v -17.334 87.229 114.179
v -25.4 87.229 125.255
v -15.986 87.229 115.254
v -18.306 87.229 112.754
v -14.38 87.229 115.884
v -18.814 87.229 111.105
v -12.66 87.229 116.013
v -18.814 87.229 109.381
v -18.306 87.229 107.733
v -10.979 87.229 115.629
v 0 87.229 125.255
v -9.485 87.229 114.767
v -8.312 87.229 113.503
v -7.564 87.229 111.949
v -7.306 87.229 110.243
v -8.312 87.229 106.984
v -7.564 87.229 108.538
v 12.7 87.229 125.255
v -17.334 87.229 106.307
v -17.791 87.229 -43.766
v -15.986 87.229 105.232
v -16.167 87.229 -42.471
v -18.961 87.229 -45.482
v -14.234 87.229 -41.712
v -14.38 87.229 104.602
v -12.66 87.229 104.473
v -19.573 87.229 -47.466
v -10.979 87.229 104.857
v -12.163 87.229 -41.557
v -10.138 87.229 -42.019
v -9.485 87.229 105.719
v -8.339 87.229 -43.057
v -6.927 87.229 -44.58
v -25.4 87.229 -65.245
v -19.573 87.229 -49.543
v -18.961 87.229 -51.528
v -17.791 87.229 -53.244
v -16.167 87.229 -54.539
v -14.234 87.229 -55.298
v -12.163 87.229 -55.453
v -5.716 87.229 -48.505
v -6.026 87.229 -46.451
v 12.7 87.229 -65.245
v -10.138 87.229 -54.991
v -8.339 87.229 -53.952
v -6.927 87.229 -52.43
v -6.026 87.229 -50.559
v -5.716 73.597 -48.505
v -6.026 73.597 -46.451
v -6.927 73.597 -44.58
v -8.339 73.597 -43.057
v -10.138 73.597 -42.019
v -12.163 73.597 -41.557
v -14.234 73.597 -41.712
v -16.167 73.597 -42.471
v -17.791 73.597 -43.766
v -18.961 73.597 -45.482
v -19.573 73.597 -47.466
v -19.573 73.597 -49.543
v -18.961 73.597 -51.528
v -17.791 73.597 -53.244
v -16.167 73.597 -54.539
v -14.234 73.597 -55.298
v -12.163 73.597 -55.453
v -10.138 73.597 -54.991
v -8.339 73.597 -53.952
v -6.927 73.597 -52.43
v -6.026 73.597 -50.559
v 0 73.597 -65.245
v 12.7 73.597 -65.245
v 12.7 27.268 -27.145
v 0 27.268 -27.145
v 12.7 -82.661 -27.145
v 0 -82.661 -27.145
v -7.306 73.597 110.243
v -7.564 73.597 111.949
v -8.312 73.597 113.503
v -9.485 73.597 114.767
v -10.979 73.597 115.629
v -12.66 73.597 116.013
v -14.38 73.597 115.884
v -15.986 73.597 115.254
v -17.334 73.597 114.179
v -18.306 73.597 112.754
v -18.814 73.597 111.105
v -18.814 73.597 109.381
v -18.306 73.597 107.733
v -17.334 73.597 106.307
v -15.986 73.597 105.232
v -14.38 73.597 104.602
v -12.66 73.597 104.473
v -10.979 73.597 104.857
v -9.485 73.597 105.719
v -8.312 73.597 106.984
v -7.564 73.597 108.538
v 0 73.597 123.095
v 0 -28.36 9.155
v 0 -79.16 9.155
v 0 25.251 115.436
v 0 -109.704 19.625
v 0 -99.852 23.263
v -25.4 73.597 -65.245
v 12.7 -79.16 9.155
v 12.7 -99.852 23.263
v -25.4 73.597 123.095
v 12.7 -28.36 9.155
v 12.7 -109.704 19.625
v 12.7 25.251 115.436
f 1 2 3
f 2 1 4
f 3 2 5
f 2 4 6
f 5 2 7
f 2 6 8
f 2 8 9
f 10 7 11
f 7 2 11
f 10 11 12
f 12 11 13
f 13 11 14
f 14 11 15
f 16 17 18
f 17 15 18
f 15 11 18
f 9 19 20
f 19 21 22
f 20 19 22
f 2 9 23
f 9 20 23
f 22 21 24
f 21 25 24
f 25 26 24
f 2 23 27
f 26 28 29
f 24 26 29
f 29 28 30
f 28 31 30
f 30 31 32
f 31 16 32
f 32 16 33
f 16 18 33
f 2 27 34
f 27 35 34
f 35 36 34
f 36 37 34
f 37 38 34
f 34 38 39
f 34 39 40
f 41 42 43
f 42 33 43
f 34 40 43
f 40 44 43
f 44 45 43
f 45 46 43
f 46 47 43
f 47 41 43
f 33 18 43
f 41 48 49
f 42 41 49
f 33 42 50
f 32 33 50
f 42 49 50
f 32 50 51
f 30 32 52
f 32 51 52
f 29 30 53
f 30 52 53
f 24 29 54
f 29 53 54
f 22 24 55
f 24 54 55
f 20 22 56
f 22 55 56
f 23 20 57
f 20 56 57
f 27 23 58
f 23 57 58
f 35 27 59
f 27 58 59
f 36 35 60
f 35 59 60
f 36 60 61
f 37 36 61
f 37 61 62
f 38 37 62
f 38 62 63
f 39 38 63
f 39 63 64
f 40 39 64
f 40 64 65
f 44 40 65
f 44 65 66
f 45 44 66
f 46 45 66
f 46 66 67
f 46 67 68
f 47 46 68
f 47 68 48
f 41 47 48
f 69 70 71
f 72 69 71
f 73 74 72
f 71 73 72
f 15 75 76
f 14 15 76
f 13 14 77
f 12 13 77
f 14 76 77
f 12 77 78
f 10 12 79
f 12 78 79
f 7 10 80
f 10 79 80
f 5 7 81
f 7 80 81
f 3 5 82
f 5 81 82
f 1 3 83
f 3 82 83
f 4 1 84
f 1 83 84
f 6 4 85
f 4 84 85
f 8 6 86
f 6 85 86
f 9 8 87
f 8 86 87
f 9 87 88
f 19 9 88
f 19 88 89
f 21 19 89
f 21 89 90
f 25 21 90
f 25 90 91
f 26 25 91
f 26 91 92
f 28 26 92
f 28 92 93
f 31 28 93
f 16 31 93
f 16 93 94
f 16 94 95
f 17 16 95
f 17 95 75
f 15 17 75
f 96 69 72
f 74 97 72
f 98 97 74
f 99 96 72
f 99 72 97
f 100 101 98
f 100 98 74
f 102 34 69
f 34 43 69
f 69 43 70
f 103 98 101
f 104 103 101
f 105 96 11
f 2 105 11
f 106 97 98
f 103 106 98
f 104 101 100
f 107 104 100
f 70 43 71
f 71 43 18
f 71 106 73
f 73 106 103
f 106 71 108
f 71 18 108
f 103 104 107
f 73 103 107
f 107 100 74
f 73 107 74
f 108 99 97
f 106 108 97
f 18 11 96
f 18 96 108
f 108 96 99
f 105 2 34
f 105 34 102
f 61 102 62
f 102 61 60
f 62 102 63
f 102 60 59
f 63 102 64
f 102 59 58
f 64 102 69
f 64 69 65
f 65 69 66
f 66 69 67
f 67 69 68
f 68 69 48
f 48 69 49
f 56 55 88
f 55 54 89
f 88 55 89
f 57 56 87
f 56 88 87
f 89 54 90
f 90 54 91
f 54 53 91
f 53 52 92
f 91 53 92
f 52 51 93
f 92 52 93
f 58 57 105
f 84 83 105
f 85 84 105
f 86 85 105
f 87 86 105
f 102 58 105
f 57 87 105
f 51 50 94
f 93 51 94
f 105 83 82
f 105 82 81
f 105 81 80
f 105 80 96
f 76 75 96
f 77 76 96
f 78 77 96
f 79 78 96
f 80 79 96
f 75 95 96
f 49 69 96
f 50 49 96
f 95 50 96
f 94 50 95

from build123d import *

# Parameters (mm, degrees)
F1_DEPTH = 12.7
F2_W     = 12.7
F2_H     = 59.960696
F3_DEPTH = 38.1
F5_DEPTH = 25.4
F7_DEPTH = 25.4
F8_R     = 5.786168
F8_R_2   = 6.967472
F9_DEPTH = 25.4


with BuildPart() as f1:
    # F0 (on Right) → F1 (new body)
    with BuildSketch(Plane.YZ):
        Polygon((-109.703772, 19.6246), (-82.661435, -27.145265), (87.22869, -27.145265), (87.22869, 125.254735), (25.250674, 115.436092), (-28.360057, 9.155148), (-79.160057, 9.155148), (-99.851914, 23.26324), align=None)
    extrude(amount=F1_DEPTH)

    # F2 (on face) → F3 (join)
    with BuildSketch(Plane(origin=(0, 0, -27.145265), x_dir=(1, 0, 0), z_dir=(0, 0, -1))):
        with Locations((6.35, -57.248342)):
            Rectangle(F2_W, F2_H)
    extrude(amount=F3_DEPTH)

    # F4 (on face) → F5 (cut)
    with BuildSketch(Plane.YZ.offset(12.7)):
        Polygon((73.597223, -65.245265), (27.267994, -27.145265), (27.267994, -65.245265), align=None)
    extrude(amount=-F5_DEPTH, mode=Mode.SUBTRACT)

    # F6 (on face) → F7 (join)
    with BuildSketch(Plane(origin=(0, 0, 0), x_dir=(0, -1, 0), z_dir=(-1, 0, 0))):
        Polygon((-87.22869, 125.254735), (-87.22869, -65.245265), (-73.597223, -65.245265), (-73.597223, 123.095219), align=None)
    extrude(amount=F7_DEPTH)

    # F8 (on face) → F9 (cut)
    with BuildSketch(Plane.XZ.offset(-73.597223)):
        with Locations((-13.092614, 110.243045)):
            Circle(F8_R)
        with Locations((-12.68347, -48.504848)):
            Circle(F8_R_2)
    extrude(amount=-F9_DEPTH, mode=Mode.SUBTRACT)


solid = f1.part
